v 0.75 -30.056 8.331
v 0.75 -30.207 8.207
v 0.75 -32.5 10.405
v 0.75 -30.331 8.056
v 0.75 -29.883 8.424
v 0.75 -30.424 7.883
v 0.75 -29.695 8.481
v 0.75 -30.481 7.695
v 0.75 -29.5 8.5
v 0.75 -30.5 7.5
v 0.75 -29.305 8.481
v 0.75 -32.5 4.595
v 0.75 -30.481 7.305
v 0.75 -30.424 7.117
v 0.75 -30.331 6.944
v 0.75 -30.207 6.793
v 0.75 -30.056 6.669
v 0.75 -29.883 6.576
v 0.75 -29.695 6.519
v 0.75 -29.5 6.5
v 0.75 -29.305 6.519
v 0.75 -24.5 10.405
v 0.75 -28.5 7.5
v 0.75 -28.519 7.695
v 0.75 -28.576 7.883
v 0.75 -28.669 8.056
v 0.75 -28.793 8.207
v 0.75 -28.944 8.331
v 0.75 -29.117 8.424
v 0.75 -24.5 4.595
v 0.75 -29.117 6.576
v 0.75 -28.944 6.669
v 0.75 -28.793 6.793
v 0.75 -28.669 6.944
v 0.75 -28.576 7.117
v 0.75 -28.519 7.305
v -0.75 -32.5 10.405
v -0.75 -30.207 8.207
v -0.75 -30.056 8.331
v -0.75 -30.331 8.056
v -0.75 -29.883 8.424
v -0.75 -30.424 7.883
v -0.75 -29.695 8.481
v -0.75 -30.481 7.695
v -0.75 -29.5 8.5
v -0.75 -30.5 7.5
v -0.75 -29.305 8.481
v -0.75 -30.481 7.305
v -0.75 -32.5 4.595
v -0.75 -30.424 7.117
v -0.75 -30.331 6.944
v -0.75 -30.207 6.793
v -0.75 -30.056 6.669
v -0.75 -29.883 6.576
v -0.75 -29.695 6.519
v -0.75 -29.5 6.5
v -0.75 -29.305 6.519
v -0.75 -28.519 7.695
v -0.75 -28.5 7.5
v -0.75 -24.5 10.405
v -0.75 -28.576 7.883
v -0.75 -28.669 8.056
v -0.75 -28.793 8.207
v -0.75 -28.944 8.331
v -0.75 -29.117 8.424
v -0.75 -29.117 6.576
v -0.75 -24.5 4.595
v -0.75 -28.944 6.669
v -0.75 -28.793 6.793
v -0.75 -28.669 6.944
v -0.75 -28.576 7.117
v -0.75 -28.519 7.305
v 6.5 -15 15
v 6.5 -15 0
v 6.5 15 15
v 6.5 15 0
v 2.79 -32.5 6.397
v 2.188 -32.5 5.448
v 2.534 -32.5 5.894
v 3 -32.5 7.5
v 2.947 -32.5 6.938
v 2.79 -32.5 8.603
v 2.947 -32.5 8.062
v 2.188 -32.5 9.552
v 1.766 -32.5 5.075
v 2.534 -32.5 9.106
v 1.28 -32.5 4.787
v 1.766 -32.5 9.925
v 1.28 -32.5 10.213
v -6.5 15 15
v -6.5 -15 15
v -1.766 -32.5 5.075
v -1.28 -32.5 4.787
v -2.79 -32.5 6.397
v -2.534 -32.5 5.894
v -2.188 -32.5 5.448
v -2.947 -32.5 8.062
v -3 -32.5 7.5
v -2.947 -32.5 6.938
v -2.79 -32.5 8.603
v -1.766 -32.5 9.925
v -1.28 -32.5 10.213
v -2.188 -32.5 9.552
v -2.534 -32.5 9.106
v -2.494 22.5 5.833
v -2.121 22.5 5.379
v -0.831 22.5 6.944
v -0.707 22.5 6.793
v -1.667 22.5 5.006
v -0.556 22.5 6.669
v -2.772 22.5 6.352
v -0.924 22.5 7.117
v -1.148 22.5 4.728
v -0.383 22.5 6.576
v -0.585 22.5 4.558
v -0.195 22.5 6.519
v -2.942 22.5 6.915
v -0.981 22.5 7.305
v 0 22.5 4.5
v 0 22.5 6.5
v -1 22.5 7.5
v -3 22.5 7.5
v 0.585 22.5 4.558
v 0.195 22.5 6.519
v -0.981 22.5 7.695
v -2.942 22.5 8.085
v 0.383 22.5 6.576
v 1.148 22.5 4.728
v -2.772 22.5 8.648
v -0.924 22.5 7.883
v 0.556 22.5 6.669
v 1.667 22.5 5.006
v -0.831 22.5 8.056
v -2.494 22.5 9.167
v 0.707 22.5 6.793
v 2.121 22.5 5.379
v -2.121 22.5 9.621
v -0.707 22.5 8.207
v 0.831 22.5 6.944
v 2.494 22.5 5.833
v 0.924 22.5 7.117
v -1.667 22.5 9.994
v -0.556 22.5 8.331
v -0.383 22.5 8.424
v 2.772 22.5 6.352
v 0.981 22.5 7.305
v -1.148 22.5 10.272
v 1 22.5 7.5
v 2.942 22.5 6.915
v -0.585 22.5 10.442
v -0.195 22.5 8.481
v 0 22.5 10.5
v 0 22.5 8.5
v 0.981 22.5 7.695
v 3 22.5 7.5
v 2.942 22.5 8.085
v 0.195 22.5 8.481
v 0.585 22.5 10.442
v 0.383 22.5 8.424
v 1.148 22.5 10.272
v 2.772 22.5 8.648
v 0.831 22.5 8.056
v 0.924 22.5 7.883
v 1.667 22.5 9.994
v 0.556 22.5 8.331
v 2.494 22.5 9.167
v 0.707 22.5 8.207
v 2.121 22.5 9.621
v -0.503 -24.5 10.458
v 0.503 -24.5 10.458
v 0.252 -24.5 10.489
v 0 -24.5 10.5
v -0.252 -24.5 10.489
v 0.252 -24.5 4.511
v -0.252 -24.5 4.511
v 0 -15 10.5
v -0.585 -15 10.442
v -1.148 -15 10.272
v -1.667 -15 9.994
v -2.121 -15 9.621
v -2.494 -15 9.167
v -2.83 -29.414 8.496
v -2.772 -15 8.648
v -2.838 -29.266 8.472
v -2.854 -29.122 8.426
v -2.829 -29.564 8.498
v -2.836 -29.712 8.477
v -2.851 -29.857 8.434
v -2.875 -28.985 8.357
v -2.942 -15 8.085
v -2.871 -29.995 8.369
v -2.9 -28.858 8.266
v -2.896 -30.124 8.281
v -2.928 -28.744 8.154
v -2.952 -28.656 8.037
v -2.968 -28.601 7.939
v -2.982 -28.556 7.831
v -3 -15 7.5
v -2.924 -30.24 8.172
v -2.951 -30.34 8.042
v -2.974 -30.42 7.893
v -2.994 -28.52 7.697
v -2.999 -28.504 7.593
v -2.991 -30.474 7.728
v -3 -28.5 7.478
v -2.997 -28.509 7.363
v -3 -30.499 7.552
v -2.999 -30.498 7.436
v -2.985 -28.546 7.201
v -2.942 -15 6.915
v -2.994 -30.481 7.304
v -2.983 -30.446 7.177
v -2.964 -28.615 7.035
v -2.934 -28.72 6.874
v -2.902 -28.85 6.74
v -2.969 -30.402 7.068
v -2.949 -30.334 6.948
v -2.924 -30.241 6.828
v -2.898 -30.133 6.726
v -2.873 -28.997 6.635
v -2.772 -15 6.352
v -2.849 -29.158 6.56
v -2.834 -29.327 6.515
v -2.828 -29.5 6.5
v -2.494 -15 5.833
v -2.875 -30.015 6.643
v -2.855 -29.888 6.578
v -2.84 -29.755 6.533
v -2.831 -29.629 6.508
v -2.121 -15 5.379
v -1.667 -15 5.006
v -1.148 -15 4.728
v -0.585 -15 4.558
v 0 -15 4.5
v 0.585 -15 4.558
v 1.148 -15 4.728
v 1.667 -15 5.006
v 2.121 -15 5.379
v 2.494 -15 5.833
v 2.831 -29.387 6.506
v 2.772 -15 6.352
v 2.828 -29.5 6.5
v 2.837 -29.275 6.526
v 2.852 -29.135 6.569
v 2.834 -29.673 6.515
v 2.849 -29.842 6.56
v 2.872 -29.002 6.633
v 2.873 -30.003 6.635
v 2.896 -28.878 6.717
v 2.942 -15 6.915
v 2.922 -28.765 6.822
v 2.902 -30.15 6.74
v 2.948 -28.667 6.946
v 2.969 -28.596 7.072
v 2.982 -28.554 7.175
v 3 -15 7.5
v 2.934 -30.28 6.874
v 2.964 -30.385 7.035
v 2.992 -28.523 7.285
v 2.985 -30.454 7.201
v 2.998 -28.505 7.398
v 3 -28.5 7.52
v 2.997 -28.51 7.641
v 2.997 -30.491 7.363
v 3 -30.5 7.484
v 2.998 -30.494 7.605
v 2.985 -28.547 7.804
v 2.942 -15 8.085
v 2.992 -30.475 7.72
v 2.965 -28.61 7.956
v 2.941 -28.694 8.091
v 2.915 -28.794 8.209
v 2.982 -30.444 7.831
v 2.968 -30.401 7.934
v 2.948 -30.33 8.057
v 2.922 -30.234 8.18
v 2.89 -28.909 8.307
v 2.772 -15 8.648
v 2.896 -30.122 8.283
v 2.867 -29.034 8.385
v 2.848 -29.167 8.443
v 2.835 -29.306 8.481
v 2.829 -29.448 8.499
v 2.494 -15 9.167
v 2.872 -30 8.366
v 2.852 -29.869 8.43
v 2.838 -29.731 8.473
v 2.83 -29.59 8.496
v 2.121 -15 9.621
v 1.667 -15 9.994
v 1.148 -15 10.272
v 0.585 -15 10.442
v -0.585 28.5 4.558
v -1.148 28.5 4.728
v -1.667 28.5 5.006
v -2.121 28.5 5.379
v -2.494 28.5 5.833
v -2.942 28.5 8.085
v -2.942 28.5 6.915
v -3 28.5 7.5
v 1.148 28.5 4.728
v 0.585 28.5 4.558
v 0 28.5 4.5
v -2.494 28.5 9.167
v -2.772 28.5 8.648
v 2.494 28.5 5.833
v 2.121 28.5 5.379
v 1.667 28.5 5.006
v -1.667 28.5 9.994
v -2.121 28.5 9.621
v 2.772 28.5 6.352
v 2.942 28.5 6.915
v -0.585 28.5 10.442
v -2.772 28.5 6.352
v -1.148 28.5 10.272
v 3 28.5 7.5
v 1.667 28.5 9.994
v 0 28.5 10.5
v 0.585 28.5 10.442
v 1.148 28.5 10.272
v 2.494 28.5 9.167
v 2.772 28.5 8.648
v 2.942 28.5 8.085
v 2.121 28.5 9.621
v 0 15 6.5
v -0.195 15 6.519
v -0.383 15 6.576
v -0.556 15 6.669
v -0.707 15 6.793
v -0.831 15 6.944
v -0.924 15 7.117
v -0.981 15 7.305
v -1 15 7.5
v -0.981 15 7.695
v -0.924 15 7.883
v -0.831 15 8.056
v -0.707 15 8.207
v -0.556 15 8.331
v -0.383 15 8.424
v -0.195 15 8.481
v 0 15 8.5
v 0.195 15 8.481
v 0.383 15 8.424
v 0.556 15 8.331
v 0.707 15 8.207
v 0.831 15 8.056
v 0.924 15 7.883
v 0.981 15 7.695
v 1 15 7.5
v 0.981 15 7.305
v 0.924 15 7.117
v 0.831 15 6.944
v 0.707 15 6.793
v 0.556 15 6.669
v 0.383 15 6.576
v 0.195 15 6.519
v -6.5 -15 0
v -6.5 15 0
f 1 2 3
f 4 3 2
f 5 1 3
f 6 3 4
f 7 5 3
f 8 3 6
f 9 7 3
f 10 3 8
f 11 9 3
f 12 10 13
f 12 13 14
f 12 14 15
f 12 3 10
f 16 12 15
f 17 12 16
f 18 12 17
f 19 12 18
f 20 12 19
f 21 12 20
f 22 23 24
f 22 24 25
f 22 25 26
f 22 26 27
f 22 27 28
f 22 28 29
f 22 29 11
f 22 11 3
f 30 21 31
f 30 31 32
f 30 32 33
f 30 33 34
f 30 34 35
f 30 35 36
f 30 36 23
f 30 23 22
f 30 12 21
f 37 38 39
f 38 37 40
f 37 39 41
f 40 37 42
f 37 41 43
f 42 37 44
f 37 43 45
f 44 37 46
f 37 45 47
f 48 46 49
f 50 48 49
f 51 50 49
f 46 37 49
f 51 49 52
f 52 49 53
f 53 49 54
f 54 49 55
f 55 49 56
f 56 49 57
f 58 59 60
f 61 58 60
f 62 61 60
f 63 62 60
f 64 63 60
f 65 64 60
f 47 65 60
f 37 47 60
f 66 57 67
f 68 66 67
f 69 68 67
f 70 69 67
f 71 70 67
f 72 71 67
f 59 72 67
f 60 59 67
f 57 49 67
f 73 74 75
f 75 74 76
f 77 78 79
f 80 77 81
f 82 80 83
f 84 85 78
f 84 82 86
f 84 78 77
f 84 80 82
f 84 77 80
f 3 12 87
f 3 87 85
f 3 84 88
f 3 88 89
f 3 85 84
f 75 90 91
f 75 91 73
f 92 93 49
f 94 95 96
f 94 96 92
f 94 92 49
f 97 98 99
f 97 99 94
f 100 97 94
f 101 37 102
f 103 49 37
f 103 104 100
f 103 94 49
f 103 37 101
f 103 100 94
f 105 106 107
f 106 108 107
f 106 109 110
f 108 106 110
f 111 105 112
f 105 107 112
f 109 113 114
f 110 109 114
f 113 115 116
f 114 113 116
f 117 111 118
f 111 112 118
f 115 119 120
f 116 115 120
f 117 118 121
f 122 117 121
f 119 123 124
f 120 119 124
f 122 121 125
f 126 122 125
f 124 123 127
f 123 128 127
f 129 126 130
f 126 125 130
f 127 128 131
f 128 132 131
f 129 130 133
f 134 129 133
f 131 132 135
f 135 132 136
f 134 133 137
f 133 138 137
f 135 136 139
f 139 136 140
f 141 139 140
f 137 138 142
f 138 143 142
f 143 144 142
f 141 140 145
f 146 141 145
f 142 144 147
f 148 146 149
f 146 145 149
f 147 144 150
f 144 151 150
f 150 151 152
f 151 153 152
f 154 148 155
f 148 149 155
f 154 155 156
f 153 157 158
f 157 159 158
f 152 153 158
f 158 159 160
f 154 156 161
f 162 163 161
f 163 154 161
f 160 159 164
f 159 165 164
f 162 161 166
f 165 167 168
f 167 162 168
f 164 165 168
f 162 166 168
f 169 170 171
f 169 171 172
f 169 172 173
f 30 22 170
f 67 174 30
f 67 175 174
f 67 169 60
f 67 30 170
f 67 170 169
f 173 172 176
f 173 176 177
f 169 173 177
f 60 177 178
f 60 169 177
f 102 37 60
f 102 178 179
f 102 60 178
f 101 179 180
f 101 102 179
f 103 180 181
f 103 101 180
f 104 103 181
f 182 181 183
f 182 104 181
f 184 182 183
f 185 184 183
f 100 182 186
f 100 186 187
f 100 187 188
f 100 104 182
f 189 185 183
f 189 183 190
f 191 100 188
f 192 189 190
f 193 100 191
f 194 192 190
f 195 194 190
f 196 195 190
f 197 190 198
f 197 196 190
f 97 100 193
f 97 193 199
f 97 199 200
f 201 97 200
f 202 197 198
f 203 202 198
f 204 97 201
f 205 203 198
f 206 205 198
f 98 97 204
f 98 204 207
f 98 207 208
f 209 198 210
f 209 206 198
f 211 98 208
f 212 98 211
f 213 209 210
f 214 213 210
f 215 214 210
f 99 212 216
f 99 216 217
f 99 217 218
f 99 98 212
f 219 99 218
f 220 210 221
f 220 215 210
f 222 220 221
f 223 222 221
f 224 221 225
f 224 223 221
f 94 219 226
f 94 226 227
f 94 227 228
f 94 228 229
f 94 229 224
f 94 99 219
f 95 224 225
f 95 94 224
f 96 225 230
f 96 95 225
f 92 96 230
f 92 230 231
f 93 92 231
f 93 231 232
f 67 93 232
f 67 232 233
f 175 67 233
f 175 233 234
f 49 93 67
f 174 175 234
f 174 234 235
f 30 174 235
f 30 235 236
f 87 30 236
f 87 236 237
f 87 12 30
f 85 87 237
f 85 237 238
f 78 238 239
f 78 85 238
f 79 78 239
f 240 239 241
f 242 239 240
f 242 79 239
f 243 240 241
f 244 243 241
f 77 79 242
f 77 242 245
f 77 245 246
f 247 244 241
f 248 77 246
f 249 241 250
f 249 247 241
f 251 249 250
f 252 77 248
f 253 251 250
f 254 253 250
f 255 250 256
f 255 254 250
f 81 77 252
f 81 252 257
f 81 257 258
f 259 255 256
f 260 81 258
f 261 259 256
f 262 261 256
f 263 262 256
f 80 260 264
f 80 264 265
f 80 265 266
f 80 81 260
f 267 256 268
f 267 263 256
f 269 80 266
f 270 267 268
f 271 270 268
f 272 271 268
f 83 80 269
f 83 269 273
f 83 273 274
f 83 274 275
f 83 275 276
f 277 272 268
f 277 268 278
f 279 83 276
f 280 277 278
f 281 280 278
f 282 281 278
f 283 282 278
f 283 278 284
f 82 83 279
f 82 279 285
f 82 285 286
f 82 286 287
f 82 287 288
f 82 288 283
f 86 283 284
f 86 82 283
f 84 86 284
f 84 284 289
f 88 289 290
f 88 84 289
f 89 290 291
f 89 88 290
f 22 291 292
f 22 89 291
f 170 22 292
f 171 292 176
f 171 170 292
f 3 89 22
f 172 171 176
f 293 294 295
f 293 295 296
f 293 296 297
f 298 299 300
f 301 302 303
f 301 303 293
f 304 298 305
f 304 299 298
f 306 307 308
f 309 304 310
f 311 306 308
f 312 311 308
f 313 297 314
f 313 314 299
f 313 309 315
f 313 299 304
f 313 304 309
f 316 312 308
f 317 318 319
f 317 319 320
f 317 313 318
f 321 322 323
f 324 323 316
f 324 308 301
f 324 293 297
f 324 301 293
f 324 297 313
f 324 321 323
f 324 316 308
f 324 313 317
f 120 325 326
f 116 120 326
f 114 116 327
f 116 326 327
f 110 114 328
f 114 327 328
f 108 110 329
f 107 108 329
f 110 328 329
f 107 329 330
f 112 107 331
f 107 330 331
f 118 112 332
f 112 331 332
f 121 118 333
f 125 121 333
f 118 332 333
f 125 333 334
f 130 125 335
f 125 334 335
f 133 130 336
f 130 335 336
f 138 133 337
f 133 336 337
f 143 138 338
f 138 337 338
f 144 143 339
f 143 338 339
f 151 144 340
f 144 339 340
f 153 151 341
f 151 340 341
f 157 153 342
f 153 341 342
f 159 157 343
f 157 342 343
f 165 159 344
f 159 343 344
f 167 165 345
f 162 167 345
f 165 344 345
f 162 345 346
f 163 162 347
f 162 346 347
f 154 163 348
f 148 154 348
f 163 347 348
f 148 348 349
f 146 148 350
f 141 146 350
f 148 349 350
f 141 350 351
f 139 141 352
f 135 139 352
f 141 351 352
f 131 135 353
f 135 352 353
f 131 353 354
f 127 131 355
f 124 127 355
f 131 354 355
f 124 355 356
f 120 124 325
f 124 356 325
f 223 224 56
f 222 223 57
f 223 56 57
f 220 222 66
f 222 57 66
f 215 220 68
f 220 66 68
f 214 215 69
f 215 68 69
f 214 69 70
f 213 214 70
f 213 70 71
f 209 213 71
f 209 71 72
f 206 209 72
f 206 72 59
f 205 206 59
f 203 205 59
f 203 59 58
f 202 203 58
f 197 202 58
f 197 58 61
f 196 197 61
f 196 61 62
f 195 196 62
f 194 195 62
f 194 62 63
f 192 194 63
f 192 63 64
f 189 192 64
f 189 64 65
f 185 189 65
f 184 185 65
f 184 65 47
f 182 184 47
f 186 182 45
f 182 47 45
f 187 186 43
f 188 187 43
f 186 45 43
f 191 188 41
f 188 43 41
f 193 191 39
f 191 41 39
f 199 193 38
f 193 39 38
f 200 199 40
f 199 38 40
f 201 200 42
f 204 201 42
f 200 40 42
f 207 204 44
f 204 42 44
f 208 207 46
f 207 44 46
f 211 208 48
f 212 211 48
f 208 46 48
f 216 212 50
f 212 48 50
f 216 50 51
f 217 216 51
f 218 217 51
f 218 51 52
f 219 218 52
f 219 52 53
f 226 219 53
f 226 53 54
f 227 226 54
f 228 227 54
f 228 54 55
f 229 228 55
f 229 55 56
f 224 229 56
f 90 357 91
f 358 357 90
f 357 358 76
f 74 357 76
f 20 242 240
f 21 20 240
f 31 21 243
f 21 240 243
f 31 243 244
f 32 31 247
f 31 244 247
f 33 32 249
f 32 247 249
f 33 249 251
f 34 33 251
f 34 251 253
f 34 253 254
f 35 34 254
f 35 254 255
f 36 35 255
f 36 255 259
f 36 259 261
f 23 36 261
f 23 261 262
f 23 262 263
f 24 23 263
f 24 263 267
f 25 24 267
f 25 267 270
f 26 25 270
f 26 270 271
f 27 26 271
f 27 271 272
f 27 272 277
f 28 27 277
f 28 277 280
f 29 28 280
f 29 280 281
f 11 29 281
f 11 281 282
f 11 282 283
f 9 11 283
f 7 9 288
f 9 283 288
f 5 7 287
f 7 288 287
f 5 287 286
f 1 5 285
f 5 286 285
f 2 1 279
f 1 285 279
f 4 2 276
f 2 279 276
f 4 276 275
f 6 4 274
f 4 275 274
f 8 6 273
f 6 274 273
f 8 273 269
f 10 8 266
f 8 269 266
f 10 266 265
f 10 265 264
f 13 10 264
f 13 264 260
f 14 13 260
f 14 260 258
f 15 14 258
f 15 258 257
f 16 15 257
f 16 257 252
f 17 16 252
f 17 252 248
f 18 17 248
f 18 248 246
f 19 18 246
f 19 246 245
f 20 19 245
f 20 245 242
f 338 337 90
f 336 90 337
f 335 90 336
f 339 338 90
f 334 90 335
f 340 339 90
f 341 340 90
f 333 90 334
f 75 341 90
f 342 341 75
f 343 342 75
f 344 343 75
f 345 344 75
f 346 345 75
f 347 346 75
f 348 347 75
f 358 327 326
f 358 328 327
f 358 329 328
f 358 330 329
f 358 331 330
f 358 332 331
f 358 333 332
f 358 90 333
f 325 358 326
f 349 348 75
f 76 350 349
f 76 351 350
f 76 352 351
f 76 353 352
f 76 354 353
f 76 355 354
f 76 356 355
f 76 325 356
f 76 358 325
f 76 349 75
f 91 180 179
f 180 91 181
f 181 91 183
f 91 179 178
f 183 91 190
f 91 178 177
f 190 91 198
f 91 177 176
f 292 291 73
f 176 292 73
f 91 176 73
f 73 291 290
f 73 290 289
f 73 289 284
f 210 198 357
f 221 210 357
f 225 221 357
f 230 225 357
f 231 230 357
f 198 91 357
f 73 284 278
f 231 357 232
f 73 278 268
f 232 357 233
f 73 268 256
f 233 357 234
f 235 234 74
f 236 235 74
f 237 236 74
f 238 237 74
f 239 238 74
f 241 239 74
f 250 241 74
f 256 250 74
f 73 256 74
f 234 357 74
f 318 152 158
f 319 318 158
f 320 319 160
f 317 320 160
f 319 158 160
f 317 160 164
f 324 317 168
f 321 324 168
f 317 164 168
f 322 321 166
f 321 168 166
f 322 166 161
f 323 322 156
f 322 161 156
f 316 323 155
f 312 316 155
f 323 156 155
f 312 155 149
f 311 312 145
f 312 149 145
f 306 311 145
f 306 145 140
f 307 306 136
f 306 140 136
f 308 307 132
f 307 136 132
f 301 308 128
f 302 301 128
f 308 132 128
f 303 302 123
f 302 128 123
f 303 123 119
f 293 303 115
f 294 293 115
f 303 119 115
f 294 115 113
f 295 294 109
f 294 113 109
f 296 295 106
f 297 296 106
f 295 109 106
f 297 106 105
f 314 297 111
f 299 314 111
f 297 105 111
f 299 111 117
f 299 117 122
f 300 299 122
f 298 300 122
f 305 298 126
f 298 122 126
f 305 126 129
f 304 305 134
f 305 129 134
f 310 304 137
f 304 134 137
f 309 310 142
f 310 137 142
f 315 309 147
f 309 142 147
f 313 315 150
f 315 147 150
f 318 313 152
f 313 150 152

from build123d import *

# Parameters (mm, degrees)
SKETCH1_W           = 13
SKETCH1_H           = 30
BOSS_EXTRUDE1_DEPTH = 15
SKETCH2_R           = 1
BOSS_EXTRUDE2_DEPTH = 7.5
SKETCH3_R           = 3
BOSS_EXTRUDE3_DEPTH = 6
BOSS_EXTRUDE4_START = 17.5
SKETCH4_R           = 3
BOSS_EXTRUDE4_DEPTH = 17.5
SKETCH5_R           = 1
CUT_EXTRUDE1_DEPTH  = 38.033768374
SKETCH6_W           = 1.5
SKETCH6_H           = 8
CUT_EXTRUDE2_DEPTH  = 35.767082226


with BuildPart() as part:
    # Sketch1 → Boss-Extrude1 (new body)
    with BuildSketch(Plane.XY):
        Rectangle(SKETCH1_W, SKETCH1_H)
    extrude(amount=BOSS_EXTRUDE1_DEPTH)

    # Sketch2 → Boss-Extrude2 (add)
    with BuildSketch(Plane(origin=(0, 15, 0), x_dir=(1, 0, 0), z_dir=(0, 1, 0))):
        with Locations((0, -7.5)):
            Circle(SKETCH2_R)
    extrude(amount=BOSS_EXTRUDE2_DEPTH)

    # Sketch3 → Boss-Extrude3 (add)
    with BuildSketch(Plane(origin=(0, 22.5, 0), x_dir=(1, 0, 0), z_dir=(0, 1, 0))):
        with Locations((0, -7.5)):
            Circle(SKETCH3_R)
    extrude(amount=BOSS_EXTRUDE3_DEPTH)

    # Sketch4 → Boss-Extrude4 (add)
    with BuildSketch(Plane.XZ.offset(15).offset(BOSS_EXTRUDE4_START)):
        with Locations((0, 7.5)):
            Circle(SKETCH4_R)
    extrude(amount=-BOSS_EXTRUDE4_DEPTH)

    # Sketch5 → Cut-Extrude1 (cut, through all)
    with BuildSketch(Plane(origin=(3, 0, 0), x_dir=(0, 0, -1), z_dir=(1, 0, 0))):
        with Locations((-7.5, -29.5)):
            Circle(SKETCH5_R)
    extrude(amount=-CUT_EXTRUDE1_DEPTH, mode=Mode.SUBTRACT)

    # Sketch6 → Cut-Extrude2 (cut, through all)
    with BuildSketch(Plane(origin=(0, 0, 4.5), x_dir=(-1, 0, 0), z_dir=(0, 0, -1))):
        with Locations((0, -28.5)):
            Rectangle(SKETCH6_W, SKETCH6_H)
    extrude(amount=-CUT_EXTRUDE2_DEPTH, mode=Mode.SUBTRACT)


solid = part.part
